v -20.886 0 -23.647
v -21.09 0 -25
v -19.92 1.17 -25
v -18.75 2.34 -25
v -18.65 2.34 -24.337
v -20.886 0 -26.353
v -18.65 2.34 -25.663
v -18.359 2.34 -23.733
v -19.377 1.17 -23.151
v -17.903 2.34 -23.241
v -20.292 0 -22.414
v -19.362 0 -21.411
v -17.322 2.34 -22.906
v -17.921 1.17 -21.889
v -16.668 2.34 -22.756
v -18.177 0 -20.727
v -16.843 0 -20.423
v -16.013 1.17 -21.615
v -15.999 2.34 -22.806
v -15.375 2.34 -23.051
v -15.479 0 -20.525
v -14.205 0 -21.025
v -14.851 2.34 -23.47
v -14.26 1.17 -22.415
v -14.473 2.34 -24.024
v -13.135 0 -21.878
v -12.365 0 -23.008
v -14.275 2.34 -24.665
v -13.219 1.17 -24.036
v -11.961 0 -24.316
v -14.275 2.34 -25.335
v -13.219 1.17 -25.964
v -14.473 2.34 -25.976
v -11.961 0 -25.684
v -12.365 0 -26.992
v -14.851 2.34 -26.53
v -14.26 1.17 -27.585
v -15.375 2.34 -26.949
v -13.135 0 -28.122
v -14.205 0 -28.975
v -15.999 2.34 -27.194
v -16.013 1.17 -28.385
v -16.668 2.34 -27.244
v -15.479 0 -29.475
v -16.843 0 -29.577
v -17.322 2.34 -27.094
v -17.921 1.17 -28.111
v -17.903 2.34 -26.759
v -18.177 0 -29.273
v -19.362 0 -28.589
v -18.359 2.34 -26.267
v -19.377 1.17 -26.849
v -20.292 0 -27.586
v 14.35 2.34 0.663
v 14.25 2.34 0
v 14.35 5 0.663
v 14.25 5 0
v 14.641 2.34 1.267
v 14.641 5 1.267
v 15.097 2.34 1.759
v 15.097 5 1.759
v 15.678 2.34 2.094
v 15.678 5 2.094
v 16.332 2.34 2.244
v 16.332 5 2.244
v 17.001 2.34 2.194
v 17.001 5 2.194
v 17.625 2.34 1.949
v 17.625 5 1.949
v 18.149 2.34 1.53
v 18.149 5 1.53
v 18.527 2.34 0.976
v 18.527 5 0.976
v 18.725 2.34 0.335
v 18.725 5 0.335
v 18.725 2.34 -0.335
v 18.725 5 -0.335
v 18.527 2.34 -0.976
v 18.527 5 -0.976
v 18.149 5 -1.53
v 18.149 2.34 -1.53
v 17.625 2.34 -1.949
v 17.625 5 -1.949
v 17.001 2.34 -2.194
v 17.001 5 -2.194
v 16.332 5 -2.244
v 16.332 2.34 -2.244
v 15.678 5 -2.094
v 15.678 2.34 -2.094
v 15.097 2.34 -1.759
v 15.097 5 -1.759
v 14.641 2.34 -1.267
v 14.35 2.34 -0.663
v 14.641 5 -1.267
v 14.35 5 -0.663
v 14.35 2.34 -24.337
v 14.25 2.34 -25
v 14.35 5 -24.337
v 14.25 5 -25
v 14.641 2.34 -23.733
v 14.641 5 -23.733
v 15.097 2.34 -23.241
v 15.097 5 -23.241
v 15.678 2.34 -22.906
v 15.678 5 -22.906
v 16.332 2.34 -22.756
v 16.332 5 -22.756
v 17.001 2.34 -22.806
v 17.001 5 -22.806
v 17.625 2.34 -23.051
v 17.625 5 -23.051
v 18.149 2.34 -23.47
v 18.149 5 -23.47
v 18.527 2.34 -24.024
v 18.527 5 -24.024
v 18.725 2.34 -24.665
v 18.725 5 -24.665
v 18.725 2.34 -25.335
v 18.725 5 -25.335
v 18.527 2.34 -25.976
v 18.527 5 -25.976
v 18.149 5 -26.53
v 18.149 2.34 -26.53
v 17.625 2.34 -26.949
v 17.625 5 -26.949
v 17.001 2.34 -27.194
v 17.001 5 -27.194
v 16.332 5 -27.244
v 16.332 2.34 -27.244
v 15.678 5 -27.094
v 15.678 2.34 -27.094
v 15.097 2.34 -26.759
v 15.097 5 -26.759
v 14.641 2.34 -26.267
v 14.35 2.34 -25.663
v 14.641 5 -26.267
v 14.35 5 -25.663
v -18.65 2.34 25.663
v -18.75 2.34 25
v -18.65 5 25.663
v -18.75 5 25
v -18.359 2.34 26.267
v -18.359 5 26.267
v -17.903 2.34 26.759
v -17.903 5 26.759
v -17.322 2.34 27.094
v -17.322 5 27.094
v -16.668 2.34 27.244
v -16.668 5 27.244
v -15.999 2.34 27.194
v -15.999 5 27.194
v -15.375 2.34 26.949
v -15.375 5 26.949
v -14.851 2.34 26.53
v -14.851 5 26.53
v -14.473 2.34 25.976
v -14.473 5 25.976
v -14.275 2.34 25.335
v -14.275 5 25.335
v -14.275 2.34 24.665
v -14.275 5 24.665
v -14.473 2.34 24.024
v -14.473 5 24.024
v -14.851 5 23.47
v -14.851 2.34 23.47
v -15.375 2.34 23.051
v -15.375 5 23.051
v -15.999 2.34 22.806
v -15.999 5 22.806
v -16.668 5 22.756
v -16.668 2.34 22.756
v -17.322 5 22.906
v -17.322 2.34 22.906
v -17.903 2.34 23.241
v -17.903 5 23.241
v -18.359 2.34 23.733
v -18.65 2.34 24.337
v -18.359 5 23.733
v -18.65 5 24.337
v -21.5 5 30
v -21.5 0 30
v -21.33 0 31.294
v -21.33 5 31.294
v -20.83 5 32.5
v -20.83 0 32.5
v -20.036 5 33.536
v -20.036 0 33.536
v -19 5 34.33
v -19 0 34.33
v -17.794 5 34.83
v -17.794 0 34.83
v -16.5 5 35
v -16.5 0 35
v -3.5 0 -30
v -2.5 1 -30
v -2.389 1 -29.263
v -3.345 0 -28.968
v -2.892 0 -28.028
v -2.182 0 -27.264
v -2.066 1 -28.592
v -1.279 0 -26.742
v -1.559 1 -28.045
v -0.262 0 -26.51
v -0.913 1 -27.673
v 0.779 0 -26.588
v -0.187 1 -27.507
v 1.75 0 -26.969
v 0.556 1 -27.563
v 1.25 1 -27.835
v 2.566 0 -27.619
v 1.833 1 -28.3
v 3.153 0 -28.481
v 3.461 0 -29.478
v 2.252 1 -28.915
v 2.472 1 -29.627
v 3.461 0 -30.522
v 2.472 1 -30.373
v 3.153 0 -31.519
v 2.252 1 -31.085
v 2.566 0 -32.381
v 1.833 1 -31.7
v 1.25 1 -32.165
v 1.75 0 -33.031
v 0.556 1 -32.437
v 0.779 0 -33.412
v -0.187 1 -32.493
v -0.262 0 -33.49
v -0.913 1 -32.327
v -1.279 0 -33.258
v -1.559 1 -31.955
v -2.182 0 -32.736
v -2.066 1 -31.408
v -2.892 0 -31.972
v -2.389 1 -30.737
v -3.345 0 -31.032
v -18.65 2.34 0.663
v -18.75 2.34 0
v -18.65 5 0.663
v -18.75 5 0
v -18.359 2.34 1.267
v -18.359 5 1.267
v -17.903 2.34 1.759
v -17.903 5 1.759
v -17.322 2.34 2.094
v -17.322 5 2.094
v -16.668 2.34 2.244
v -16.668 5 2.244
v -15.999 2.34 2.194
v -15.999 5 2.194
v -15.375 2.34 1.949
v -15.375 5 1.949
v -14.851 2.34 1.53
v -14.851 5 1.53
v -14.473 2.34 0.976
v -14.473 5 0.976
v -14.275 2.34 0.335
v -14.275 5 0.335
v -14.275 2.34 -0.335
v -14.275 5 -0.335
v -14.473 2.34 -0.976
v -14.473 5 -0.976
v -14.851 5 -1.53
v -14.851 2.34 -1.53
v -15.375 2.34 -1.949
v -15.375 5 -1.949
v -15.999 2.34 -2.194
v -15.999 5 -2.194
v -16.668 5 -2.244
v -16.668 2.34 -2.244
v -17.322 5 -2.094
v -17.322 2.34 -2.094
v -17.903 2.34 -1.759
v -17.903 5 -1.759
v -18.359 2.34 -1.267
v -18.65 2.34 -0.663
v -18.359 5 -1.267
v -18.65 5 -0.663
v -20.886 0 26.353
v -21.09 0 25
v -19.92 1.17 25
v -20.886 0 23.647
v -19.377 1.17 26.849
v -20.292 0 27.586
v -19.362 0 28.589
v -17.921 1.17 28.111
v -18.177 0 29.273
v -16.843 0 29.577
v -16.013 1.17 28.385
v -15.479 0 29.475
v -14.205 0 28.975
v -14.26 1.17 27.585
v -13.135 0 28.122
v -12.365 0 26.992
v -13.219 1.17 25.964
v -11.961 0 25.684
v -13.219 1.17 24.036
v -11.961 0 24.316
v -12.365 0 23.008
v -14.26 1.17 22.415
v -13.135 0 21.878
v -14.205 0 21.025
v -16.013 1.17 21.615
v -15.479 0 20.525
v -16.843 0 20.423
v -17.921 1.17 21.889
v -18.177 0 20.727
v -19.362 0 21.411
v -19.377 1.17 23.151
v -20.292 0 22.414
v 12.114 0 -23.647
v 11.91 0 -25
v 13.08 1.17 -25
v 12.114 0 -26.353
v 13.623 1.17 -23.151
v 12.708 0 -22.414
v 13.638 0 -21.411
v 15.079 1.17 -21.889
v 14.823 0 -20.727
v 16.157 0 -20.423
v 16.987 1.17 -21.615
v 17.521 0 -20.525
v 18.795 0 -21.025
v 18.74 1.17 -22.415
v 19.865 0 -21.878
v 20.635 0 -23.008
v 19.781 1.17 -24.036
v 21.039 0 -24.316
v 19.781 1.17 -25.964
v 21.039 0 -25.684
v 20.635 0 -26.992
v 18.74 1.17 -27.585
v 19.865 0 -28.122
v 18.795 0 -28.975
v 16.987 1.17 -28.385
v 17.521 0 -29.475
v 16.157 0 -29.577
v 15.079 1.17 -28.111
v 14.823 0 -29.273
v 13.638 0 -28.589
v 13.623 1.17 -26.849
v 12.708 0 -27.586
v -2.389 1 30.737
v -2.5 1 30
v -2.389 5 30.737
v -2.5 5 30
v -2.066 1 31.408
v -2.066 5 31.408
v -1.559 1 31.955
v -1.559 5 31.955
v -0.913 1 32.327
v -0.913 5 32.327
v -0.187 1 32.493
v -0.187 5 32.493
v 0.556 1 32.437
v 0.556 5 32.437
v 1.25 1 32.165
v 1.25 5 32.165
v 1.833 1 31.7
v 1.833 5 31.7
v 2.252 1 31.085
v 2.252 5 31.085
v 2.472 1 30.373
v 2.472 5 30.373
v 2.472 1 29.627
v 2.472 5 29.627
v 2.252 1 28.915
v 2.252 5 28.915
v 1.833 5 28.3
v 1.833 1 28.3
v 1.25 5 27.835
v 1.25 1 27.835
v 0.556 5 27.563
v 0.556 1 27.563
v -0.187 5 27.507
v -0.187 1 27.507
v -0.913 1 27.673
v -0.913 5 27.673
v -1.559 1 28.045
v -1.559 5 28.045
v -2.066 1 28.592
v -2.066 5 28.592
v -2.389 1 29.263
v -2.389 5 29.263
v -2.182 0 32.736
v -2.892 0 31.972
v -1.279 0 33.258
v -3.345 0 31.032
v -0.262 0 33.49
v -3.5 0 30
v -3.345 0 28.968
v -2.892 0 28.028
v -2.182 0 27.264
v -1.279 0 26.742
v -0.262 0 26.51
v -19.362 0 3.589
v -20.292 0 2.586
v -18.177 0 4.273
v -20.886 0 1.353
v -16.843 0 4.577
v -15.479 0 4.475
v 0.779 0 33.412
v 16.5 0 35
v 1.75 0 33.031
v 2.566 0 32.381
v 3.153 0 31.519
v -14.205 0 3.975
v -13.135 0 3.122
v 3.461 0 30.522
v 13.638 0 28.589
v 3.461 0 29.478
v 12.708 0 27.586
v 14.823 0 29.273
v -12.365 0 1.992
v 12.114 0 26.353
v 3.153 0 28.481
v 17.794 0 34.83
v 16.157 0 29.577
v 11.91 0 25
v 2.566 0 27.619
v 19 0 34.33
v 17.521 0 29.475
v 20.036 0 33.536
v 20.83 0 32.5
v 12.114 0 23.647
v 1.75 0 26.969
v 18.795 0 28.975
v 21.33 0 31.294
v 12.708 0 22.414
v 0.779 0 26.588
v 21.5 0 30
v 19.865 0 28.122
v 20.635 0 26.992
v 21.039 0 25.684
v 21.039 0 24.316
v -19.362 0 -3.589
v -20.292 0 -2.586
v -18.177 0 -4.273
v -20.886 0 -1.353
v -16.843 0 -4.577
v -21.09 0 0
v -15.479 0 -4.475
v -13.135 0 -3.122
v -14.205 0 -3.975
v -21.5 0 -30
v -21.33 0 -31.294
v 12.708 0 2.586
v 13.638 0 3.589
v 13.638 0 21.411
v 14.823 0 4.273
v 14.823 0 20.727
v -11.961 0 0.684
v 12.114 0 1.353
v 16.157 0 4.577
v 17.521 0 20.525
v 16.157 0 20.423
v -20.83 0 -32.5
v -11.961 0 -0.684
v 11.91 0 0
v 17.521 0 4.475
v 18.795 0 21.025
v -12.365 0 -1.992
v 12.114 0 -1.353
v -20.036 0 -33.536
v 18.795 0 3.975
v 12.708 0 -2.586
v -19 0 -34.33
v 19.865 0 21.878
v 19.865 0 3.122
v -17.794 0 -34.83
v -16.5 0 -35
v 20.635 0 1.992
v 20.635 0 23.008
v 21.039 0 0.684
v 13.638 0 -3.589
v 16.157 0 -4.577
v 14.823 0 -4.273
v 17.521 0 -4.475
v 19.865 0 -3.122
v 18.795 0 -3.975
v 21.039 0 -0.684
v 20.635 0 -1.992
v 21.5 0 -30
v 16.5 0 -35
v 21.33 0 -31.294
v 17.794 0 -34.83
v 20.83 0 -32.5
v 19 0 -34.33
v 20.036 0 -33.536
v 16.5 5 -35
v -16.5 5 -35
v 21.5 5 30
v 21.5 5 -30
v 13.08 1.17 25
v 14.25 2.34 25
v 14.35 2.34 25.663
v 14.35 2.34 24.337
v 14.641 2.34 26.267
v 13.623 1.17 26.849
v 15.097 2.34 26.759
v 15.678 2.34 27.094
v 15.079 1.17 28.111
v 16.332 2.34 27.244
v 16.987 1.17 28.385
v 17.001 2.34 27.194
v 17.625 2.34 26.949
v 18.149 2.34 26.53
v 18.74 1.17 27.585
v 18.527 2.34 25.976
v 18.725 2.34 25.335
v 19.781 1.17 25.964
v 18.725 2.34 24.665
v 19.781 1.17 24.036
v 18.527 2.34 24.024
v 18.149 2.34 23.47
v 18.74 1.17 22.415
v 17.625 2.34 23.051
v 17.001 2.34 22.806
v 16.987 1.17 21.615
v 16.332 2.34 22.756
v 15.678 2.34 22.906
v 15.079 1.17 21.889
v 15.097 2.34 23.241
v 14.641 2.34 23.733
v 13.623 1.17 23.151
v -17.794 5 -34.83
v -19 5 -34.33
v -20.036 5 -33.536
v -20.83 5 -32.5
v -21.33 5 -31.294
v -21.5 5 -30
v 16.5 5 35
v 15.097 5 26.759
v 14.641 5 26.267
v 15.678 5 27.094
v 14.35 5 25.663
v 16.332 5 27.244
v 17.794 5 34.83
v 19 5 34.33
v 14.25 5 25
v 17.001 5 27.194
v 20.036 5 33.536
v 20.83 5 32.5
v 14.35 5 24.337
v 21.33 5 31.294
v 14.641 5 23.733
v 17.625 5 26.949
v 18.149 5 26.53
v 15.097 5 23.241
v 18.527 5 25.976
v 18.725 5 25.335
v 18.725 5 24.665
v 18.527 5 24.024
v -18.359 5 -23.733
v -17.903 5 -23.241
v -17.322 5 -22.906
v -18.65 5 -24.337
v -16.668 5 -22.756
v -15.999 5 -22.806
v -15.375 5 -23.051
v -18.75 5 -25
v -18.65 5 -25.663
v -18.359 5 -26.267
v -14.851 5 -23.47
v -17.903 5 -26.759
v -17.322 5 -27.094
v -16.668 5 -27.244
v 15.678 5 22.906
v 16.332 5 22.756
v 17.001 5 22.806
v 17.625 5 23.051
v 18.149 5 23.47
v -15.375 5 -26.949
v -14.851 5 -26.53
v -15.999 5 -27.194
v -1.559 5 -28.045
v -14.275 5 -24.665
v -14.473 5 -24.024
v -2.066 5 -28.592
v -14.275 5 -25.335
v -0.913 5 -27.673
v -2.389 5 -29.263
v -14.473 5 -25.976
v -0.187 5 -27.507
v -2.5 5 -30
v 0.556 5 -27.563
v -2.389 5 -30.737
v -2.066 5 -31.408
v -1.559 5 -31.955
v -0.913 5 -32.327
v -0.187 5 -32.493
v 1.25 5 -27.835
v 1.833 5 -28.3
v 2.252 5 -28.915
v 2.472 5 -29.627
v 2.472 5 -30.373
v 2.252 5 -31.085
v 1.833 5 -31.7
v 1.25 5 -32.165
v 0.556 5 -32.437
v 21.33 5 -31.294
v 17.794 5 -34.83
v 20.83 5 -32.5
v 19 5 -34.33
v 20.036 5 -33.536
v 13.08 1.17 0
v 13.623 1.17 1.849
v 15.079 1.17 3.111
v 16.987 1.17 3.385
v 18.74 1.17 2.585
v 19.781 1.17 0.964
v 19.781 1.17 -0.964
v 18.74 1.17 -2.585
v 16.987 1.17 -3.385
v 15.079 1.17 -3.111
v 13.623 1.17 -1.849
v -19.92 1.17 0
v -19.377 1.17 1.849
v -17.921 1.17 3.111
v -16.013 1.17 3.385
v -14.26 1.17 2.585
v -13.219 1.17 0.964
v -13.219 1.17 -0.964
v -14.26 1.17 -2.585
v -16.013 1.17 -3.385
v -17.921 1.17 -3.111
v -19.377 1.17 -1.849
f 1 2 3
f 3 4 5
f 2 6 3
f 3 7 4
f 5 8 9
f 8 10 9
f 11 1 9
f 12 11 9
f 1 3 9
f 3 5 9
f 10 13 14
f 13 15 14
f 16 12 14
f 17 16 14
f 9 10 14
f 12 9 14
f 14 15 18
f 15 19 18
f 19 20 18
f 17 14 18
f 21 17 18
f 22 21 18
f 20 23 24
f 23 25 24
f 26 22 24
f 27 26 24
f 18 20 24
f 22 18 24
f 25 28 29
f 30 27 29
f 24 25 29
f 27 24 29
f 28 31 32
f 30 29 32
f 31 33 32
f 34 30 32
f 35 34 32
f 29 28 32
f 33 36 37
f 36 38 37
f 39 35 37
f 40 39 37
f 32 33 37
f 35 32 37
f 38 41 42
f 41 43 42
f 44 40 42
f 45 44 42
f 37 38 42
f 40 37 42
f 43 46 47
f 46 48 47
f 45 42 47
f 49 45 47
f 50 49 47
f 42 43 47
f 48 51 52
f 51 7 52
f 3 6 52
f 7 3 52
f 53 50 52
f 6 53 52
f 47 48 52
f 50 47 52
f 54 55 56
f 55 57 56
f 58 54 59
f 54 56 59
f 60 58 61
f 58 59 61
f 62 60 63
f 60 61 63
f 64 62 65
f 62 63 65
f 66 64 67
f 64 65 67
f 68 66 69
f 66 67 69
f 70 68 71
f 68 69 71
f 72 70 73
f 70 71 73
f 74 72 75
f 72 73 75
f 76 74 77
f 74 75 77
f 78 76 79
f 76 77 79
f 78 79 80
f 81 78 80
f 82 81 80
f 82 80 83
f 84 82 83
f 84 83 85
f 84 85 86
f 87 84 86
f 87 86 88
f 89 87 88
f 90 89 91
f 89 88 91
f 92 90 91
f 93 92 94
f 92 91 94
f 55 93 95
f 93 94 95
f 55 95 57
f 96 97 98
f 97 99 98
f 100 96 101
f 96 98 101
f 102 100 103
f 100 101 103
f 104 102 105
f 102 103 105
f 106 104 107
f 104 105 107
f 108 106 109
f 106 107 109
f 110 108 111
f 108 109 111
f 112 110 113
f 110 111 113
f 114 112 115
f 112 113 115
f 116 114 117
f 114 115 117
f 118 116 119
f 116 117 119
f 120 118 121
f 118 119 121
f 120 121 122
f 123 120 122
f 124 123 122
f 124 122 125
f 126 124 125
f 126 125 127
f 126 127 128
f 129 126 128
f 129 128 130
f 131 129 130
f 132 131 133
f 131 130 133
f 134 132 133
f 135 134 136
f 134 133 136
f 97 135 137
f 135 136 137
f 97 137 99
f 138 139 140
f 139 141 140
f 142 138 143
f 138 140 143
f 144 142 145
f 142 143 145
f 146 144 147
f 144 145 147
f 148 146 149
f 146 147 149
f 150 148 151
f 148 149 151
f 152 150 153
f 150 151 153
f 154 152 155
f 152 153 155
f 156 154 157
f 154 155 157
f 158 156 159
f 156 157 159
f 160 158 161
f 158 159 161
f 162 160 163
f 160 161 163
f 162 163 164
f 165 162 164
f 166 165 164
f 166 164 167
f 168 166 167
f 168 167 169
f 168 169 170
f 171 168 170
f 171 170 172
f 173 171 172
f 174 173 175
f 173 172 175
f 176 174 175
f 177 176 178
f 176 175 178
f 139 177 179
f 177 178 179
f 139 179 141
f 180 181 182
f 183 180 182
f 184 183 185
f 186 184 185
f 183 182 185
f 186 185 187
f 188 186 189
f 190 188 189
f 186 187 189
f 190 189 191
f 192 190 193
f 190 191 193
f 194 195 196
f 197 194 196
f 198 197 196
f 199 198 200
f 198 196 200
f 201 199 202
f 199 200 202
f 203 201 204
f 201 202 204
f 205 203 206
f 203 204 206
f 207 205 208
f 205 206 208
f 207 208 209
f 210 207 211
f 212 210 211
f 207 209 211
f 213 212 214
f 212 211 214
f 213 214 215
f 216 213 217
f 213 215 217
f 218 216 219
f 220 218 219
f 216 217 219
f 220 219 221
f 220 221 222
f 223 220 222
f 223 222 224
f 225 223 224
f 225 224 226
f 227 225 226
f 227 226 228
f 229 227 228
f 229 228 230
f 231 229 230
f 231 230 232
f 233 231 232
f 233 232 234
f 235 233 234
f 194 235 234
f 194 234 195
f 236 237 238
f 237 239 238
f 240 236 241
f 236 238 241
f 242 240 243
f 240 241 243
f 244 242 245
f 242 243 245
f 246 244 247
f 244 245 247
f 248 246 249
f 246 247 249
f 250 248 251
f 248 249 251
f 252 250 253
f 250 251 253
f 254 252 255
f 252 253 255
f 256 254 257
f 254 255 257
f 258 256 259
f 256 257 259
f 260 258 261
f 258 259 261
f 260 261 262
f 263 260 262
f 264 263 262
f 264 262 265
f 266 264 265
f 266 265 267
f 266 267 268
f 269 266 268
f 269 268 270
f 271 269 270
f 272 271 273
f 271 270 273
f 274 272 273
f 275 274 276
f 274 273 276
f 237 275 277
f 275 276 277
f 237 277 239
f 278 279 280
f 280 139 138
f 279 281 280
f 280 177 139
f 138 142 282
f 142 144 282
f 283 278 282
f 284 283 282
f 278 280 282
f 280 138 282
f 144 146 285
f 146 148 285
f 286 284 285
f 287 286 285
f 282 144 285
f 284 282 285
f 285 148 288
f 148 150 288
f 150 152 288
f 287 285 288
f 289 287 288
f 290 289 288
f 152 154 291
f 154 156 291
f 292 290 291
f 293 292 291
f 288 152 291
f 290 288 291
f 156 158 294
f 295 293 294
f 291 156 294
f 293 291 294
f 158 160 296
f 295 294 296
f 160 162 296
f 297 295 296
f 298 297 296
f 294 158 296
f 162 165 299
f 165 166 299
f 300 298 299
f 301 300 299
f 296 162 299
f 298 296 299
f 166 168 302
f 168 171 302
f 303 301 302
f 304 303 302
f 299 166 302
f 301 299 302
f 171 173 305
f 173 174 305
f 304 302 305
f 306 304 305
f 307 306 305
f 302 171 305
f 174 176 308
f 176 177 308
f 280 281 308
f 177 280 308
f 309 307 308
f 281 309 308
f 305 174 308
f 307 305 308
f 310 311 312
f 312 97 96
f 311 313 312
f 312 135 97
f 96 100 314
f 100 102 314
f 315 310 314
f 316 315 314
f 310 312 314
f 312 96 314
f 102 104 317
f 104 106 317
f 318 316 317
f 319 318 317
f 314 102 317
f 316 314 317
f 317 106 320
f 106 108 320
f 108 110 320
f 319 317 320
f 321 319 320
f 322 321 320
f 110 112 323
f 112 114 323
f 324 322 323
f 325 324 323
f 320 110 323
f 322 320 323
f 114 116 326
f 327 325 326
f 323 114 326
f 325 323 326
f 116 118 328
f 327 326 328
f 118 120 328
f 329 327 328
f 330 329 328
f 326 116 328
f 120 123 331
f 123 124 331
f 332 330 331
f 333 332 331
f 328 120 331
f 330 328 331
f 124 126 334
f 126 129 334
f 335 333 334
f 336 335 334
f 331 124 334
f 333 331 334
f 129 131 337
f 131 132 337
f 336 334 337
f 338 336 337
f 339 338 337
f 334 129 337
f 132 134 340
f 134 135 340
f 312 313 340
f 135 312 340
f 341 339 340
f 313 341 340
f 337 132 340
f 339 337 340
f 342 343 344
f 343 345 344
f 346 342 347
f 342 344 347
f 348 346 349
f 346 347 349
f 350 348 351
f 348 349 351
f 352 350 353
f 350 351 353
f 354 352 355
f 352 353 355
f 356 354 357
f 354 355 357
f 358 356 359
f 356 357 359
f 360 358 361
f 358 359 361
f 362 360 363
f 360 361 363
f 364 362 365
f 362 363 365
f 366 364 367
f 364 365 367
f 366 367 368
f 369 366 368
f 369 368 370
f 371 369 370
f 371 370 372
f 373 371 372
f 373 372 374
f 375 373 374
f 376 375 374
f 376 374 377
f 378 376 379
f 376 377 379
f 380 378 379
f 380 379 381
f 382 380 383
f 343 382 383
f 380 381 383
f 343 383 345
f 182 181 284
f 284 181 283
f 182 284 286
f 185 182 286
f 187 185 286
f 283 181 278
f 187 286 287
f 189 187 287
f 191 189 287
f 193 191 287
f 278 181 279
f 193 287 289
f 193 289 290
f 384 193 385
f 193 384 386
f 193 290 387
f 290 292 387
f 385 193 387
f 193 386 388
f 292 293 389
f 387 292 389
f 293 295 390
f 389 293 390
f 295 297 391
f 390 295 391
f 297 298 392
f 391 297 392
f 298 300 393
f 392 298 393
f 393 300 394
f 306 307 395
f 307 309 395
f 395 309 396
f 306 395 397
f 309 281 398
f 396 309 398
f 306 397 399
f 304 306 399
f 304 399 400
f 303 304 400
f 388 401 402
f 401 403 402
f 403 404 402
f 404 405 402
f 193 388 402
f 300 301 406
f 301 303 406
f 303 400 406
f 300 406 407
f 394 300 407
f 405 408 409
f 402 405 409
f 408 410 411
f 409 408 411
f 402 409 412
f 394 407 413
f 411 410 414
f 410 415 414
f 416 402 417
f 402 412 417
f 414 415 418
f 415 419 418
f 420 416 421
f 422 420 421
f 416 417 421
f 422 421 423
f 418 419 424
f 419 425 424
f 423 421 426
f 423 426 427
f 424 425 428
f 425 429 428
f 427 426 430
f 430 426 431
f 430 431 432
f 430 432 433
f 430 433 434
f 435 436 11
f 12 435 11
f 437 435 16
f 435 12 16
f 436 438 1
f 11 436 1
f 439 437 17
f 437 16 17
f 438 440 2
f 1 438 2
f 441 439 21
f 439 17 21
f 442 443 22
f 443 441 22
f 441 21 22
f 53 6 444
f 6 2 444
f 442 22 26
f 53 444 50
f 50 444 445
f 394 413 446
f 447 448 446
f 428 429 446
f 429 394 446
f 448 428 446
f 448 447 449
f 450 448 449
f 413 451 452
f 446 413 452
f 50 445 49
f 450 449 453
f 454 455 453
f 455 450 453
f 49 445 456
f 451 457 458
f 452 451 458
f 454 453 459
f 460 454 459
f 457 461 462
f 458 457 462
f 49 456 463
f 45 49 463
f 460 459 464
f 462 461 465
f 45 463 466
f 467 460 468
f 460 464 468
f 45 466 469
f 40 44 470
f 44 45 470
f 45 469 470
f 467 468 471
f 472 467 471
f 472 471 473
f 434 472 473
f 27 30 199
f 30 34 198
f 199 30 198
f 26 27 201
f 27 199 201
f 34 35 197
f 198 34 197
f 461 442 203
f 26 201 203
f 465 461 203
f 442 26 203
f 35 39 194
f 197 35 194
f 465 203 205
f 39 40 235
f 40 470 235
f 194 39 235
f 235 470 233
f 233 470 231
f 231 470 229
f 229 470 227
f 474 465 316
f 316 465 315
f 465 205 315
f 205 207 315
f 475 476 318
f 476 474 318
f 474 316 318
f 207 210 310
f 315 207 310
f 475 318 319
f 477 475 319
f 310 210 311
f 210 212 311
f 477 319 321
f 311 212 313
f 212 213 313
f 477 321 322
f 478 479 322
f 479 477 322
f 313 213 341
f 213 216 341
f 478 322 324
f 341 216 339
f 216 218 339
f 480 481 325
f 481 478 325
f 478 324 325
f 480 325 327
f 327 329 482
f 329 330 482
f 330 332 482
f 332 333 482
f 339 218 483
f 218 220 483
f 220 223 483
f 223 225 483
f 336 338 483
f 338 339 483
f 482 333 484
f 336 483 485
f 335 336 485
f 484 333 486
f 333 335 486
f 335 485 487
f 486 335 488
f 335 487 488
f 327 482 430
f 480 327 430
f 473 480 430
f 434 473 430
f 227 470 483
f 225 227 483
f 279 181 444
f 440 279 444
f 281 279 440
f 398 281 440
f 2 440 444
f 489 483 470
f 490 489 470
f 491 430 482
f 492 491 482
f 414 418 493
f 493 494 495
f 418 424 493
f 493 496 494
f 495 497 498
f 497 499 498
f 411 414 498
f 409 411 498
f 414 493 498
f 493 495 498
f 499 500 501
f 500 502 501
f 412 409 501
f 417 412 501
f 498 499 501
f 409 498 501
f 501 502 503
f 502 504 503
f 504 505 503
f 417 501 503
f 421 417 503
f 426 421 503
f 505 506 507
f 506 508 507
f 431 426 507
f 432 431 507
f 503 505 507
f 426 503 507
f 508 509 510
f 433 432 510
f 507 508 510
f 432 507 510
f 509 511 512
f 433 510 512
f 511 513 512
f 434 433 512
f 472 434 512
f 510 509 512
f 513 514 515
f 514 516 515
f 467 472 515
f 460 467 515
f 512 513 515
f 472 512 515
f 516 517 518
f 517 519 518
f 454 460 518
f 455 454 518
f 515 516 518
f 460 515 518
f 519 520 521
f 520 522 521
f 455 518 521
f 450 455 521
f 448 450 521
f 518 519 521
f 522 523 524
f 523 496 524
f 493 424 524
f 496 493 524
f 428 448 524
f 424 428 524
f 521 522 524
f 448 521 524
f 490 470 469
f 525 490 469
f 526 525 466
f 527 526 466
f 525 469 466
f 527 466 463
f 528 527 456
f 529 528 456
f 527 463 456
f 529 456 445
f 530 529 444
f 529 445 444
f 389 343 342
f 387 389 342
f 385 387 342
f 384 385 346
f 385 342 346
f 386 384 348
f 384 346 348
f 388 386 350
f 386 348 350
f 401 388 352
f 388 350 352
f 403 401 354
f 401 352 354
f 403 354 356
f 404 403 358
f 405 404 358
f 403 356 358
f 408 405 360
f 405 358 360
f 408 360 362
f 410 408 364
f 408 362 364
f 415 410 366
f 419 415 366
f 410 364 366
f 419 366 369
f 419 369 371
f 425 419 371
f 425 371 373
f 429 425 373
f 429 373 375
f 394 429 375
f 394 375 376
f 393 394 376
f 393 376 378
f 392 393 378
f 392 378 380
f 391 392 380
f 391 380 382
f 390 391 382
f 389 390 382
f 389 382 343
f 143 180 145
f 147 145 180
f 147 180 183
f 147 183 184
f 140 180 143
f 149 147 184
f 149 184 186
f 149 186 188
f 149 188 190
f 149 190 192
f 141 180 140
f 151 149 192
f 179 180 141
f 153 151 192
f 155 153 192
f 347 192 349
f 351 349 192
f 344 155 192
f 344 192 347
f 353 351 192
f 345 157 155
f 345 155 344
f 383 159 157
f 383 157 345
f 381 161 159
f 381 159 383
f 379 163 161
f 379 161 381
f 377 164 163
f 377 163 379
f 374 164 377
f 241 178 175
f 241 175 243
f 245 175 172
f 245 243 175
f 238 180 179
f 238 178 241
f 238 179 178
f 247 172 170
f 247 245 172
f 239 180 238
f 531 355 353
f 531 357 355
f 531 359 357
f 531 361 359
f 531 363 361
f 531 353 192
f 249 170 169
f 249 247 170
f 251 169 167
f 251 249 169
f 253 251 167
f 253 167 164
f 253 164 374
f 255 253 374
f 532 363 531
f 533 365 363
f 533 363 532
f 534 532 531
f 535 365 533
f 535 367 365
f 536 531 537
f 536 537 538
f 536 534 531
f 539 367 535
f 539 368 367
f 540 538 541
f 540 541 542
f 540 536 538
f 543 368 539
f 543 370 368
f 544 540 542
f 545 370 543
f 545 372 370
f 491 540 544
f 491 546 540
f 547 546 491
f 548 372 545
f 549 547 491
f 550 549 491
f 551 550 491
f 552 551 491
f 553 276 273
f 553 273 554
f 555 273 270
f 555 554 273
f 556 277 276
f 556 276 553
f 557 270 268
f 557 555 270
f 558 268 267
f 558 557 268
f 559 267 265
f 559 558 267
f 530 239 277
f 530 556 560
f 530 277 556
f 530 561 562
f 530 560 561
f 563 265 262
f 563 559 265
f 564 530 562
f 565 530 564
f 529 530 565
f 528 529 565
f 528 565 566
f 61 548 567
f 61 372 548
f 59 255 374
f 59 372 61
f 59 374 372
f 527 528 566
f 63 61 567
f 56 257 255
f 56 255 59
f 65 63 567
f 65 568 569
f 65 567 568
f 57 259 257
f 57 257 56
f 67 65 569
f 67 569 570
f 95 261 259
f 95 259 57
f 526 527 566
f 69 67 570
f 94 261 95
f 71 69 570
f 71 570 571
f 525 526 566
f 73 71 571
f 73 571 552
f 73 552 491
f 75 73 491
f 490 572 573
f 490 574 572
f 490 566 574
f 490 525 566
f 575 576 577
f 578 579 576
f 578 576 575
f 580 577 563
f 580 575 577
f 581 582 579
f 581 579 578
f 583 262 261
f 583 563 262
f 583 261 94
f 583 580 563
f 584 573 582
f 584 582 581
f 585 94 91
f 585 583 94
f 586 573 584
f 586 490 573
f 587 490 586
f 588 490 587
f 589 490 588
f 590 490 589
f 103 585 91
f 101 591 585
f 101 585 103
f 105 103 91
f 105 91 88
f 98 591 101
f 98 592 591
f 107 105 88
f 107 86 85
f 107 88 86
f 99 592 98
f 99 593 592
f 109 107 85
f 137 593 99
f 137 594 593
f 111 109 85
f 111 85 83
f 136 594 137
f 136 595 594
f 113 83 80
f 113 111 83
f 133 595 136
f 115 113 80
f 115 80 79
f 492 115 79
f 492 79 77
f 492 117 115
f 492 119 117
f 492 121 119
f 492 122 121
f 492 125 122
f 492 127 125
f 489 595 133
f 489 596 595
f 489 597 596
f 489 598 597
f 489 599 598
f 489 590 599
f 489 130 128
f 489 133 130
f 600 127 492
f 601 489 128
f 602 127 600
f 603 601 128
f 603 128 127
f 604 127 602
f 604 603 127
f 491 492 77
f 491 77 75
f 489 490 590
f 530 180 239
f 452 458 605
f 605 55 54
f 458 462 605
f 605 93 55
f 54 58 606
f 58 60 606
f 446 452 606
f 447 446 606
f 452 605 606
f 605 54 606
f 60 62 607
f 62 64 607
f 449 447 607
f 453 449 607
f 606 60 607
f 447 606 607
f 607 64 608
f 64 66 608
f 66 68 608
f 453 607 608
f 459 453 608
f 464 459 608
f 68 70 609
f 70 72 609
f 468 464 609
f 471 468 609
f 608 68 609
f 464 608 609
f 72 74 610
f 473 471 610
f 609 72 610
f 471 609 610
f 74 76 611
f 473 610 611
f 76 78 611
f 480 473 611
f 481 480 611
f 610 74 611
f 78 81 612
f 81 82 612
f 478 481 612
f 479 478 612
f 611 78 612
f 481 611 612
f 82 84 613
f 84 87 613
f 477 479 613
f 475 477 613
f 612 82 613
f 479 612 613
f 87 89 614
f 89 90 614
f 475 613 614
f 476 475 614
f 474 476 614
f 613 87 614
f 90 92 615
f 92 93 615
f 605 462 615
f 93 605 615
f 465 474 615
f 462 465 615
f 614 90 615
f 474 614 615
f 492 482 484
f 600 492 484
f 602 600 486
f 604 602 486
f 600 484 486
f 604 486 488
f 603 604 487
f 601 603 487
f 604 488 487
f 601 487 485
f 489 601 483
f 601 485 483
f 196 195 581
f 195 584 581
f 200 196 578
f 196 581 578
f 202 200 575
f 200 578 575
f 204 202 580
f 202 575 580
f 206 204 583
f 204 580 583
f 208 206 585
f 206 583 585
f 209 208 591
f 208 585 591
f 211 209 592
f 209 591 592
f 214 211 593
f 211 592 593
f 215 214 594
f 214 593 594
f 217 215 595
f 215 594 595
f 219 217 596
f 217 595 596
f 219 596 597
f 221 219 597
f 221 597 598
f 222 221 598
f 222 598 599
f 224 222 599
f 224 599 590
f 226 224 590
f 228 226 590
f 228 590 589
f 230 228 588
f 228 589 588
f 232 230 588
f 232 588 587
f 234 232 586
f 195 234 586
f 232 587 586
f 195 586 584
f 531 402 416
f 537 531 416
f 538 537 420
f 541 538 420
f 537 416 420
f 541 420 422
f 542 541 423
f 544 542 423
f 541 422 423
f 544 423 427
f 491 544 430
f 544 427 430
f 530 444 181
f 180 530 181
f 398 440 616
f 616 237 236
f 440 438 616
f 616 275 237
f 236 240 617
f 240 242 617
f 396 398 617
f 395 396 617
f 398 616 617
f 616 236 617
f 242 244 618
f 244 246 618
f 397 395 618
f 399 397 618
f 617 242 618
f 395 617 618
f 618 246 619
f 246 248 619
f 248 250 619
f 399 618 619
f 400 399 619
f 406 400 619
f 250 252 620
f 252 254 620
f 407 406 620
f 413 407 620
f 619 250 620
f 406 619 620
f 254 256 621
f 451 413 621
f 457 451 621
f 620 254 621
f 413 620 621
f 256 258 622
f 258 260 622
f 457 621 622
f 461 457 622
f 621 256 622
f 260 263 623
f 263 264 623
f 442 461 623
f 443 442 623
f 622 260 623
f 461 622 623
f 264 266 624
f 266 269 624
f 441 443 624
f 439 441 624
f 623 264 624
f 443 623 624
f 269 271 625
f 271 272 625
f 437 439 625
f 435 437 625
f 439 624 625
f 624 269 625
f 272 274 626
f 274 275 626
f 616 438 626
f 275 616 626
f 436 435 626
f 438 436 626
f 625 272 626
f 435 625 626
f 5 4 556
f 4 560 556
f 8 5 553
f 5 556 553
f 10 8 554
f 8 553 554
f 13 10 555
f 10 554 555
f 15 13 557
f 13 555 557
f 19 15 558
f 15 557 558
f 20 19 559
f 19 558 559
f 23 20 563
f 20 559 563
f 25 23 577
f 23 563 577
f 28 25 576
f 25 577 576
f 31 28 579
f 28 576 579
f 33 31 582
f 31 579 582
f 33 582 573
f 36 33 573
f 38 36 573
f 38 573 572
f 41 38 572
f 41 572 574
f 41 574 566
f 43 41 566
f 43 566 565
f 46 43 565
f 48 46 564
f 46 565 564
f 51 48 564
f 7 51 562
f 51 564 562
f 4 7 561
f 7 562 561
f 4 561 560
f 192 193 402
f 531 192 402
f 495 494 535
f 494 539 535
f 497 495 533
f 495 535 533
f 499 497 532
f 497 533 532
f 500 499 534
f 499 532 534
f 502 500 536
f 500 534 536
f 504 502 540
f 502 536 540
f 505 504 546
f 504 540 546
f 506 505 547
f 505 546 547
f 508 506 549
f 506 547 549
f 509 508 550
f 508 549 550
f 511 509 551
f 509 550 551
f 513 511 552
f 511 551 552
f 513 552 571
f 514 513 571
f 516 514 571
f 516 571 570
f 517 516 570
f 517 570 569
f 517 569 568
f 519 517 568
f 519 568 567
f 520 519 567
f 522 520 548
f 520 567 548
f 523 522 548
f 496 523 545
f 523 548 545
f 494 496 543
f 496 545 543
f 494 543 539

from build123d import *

# Parameters (mm, degrees)
SKETCH_2_R                  = 2.2
EXTRUDE_1_DEPTH             = 5
SKETCH_3_R                  = 2
CUT_EXTRUDE_1_DEPTH         = 50
HOLE_WIZARD_M61_D           = 5
HOLE_WIZARD_M61_CSINK_D     = 7
HOLE_WIZARD_M61_CSINK_ANGLE = 90
HOLE_WIZARD_M41_D           = 4.5
HOLE_WIZARD_M41_CSINK_D     = 9.18
HOLE_WIZARD_M41_CSINK_ANGLE = 90


with BuildPart() as part:
    # Эскиз2 → Бобышка-Вытянуть1 (new body)
    with BuildSketch(Plane(origin=(0, 0, 0), x_dir=(1, 0, 0), z_dir=(0, 1, 0))):
        with BuildLine():
            Line((-16.5, -35), (16.5, -35))
            ThreePointArc((16.5, -35), (20.035533906, -33.535533906), (21.5, -30))
            Line((21.5, -30), (21.5, 30))
            ThreePointArc((21.5, 30), (20.035533906, 33.535533906), (16.5, 35))
            Line((16.5, 35), (-16.5, 35))
            ThreePointArc((-16.5, 35), (-20.035533906, 33.535533906), (-21.5, 30))
            Line((-21.5, 30), (-21.5, -30))
            ThreePointArc((-21.5, -30), (-20.035533906, -33.535533906), (-16.5, -35))
        make_face()
        with Locations(Location((-16.5, -25, 0), (0, 0, 270))):
            Circle(SKETCH_2_R, mode=Mode.SUBTRACT)
        with Locations(Location((-16.5, 0, 0), (0, 0, 270))):
            Circle(SKETCH_2_R, mode=Mode.SUBTRACT)
        with Locations(Location((-16.5, 25, 0), (0, 0, 270))):
            Circle(SKETCH_2_R, mode=Mode.SUBTRACT)
        with Locations(Location((16.5, 0, 0), (0, 0, 90))):
            Circle(SKETCH_2_R, mode=Mode.SUBTRACT)
        with Locations(Location((16.5, 25, 0), (0, 0, 90))):
            Circle(SKETCH_2_R, mode=Mode.SUBTRACT)
        with Locations(Location((16.5, -25, 0), (0, 0, 90))):
            Circle(SKETCH_2_R, mode=Mode.SUBTRACT)
    extrude(amount=EXTRUDE_1_DEPTH)

    # Эскиз3 → Вырез-Вытянуть1 (cut)
    with BuildSketch(Plane(origin=(0, 5, 0), x_dir=(1, 0, 0), z_dir=(0, 1, 0))):
        with Locations(Location((0, 30, 0), (0, 0, 270))):
            Circle(SKETCH_3_R)
        with Locations(Location((0, -30, 0), (0, 0, 270))):
            Circle(SKETCH_3_R)
    extrude(amount=-CUT_EXTRUDE_1_DEPTH, mode=Mode.SUBTRACT)

    # Отверстие обработанное метчиком M61 (through all)
    with Locations(Plane.XZ):
        with Locations((0, -30), (0, 30)):
            CounterSinkHole(HOLE_WIZARD_M61_D / 2, HOLE_WIZARD_M61_CSINK_D / 2, counter_sink_angle=HOLE_WIZARD_M61_CSINK_ANGLE)

    # Зенковка для винта с потайной головкой и внутренним шестигранником M41 (through all)
    with Locations(Plane.XZ):
        with Locations((16.5, -25), (16.5, 0), (16.5, 25), (-16.5, 25), (-16.5, 0), (-16.5, -25)):
            CounterSinkHole(HOLE_WIZARD_M41_D / 2, HOLE_WIZARD_M41_CSINK_D / 2, counter_sink_angle=HOLE_WIZARD_M41_CSINK_ANGLE)


solid = part.part
